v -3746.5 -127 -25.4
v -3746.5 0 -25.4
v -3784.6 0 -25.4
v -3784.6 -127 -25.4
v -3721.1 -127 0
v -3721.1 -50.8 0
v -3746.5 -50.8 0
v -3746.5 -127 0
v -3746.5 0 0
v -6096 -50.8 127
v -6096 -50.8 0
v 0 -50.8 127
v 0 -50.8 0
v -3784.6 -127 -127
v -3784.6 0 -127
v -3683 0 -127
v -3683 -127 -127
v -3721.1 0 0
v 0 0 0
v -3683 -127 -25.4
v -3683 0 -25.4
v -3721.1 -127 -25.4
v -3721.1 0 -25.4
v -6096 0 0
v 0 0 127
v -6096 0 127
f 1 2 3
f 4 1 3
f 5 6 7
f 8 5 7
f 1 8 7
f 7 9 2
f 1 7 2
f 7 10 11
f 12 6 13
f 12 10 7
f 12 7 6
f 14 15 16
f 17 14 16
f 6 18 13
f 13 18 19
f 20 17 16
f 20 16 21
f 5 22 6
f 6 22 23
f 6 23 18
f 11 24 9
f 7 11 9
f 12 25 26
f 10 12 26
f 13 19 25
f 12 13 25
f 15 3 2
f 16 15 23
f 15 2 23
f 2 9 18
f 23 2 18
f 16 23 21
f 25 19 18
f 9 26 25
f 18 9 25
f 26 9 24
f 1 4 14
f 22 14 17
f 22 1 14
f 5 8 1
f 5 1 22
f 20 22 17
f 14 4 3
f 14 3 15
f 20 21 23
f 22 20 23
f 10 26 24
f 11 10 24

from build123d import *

# Parameters (mm, degrees)
F1_DEPTH = 50.8
F2_DEPTH = 127


with BuildPart() as f1:
    # F0 (on Front) → F1 (new body)
    with BuildSketch(Plane.XZ):
        Polygon((-3721.1, 0), (0, 0), (0, 127), (-6096, 127), (-6096, 0), (-3746.5, 0), align=None)
    extrude(amount=F1_DEPTH)

    # F0 (on Front) → F2 (join)
    with BuildSketch(Plane.XZ):
        Polygon((-3721.1, -25.4), (-3721.1, 0), (-3746.5, 0), (-3746.5, -25.4), (-3784.6, -25.4), (-3784.6, -127), (-3683, -127), (-3683, -25.4), align=None)
    extrude(amount=F2_DEPTH)


solid = f1.part
